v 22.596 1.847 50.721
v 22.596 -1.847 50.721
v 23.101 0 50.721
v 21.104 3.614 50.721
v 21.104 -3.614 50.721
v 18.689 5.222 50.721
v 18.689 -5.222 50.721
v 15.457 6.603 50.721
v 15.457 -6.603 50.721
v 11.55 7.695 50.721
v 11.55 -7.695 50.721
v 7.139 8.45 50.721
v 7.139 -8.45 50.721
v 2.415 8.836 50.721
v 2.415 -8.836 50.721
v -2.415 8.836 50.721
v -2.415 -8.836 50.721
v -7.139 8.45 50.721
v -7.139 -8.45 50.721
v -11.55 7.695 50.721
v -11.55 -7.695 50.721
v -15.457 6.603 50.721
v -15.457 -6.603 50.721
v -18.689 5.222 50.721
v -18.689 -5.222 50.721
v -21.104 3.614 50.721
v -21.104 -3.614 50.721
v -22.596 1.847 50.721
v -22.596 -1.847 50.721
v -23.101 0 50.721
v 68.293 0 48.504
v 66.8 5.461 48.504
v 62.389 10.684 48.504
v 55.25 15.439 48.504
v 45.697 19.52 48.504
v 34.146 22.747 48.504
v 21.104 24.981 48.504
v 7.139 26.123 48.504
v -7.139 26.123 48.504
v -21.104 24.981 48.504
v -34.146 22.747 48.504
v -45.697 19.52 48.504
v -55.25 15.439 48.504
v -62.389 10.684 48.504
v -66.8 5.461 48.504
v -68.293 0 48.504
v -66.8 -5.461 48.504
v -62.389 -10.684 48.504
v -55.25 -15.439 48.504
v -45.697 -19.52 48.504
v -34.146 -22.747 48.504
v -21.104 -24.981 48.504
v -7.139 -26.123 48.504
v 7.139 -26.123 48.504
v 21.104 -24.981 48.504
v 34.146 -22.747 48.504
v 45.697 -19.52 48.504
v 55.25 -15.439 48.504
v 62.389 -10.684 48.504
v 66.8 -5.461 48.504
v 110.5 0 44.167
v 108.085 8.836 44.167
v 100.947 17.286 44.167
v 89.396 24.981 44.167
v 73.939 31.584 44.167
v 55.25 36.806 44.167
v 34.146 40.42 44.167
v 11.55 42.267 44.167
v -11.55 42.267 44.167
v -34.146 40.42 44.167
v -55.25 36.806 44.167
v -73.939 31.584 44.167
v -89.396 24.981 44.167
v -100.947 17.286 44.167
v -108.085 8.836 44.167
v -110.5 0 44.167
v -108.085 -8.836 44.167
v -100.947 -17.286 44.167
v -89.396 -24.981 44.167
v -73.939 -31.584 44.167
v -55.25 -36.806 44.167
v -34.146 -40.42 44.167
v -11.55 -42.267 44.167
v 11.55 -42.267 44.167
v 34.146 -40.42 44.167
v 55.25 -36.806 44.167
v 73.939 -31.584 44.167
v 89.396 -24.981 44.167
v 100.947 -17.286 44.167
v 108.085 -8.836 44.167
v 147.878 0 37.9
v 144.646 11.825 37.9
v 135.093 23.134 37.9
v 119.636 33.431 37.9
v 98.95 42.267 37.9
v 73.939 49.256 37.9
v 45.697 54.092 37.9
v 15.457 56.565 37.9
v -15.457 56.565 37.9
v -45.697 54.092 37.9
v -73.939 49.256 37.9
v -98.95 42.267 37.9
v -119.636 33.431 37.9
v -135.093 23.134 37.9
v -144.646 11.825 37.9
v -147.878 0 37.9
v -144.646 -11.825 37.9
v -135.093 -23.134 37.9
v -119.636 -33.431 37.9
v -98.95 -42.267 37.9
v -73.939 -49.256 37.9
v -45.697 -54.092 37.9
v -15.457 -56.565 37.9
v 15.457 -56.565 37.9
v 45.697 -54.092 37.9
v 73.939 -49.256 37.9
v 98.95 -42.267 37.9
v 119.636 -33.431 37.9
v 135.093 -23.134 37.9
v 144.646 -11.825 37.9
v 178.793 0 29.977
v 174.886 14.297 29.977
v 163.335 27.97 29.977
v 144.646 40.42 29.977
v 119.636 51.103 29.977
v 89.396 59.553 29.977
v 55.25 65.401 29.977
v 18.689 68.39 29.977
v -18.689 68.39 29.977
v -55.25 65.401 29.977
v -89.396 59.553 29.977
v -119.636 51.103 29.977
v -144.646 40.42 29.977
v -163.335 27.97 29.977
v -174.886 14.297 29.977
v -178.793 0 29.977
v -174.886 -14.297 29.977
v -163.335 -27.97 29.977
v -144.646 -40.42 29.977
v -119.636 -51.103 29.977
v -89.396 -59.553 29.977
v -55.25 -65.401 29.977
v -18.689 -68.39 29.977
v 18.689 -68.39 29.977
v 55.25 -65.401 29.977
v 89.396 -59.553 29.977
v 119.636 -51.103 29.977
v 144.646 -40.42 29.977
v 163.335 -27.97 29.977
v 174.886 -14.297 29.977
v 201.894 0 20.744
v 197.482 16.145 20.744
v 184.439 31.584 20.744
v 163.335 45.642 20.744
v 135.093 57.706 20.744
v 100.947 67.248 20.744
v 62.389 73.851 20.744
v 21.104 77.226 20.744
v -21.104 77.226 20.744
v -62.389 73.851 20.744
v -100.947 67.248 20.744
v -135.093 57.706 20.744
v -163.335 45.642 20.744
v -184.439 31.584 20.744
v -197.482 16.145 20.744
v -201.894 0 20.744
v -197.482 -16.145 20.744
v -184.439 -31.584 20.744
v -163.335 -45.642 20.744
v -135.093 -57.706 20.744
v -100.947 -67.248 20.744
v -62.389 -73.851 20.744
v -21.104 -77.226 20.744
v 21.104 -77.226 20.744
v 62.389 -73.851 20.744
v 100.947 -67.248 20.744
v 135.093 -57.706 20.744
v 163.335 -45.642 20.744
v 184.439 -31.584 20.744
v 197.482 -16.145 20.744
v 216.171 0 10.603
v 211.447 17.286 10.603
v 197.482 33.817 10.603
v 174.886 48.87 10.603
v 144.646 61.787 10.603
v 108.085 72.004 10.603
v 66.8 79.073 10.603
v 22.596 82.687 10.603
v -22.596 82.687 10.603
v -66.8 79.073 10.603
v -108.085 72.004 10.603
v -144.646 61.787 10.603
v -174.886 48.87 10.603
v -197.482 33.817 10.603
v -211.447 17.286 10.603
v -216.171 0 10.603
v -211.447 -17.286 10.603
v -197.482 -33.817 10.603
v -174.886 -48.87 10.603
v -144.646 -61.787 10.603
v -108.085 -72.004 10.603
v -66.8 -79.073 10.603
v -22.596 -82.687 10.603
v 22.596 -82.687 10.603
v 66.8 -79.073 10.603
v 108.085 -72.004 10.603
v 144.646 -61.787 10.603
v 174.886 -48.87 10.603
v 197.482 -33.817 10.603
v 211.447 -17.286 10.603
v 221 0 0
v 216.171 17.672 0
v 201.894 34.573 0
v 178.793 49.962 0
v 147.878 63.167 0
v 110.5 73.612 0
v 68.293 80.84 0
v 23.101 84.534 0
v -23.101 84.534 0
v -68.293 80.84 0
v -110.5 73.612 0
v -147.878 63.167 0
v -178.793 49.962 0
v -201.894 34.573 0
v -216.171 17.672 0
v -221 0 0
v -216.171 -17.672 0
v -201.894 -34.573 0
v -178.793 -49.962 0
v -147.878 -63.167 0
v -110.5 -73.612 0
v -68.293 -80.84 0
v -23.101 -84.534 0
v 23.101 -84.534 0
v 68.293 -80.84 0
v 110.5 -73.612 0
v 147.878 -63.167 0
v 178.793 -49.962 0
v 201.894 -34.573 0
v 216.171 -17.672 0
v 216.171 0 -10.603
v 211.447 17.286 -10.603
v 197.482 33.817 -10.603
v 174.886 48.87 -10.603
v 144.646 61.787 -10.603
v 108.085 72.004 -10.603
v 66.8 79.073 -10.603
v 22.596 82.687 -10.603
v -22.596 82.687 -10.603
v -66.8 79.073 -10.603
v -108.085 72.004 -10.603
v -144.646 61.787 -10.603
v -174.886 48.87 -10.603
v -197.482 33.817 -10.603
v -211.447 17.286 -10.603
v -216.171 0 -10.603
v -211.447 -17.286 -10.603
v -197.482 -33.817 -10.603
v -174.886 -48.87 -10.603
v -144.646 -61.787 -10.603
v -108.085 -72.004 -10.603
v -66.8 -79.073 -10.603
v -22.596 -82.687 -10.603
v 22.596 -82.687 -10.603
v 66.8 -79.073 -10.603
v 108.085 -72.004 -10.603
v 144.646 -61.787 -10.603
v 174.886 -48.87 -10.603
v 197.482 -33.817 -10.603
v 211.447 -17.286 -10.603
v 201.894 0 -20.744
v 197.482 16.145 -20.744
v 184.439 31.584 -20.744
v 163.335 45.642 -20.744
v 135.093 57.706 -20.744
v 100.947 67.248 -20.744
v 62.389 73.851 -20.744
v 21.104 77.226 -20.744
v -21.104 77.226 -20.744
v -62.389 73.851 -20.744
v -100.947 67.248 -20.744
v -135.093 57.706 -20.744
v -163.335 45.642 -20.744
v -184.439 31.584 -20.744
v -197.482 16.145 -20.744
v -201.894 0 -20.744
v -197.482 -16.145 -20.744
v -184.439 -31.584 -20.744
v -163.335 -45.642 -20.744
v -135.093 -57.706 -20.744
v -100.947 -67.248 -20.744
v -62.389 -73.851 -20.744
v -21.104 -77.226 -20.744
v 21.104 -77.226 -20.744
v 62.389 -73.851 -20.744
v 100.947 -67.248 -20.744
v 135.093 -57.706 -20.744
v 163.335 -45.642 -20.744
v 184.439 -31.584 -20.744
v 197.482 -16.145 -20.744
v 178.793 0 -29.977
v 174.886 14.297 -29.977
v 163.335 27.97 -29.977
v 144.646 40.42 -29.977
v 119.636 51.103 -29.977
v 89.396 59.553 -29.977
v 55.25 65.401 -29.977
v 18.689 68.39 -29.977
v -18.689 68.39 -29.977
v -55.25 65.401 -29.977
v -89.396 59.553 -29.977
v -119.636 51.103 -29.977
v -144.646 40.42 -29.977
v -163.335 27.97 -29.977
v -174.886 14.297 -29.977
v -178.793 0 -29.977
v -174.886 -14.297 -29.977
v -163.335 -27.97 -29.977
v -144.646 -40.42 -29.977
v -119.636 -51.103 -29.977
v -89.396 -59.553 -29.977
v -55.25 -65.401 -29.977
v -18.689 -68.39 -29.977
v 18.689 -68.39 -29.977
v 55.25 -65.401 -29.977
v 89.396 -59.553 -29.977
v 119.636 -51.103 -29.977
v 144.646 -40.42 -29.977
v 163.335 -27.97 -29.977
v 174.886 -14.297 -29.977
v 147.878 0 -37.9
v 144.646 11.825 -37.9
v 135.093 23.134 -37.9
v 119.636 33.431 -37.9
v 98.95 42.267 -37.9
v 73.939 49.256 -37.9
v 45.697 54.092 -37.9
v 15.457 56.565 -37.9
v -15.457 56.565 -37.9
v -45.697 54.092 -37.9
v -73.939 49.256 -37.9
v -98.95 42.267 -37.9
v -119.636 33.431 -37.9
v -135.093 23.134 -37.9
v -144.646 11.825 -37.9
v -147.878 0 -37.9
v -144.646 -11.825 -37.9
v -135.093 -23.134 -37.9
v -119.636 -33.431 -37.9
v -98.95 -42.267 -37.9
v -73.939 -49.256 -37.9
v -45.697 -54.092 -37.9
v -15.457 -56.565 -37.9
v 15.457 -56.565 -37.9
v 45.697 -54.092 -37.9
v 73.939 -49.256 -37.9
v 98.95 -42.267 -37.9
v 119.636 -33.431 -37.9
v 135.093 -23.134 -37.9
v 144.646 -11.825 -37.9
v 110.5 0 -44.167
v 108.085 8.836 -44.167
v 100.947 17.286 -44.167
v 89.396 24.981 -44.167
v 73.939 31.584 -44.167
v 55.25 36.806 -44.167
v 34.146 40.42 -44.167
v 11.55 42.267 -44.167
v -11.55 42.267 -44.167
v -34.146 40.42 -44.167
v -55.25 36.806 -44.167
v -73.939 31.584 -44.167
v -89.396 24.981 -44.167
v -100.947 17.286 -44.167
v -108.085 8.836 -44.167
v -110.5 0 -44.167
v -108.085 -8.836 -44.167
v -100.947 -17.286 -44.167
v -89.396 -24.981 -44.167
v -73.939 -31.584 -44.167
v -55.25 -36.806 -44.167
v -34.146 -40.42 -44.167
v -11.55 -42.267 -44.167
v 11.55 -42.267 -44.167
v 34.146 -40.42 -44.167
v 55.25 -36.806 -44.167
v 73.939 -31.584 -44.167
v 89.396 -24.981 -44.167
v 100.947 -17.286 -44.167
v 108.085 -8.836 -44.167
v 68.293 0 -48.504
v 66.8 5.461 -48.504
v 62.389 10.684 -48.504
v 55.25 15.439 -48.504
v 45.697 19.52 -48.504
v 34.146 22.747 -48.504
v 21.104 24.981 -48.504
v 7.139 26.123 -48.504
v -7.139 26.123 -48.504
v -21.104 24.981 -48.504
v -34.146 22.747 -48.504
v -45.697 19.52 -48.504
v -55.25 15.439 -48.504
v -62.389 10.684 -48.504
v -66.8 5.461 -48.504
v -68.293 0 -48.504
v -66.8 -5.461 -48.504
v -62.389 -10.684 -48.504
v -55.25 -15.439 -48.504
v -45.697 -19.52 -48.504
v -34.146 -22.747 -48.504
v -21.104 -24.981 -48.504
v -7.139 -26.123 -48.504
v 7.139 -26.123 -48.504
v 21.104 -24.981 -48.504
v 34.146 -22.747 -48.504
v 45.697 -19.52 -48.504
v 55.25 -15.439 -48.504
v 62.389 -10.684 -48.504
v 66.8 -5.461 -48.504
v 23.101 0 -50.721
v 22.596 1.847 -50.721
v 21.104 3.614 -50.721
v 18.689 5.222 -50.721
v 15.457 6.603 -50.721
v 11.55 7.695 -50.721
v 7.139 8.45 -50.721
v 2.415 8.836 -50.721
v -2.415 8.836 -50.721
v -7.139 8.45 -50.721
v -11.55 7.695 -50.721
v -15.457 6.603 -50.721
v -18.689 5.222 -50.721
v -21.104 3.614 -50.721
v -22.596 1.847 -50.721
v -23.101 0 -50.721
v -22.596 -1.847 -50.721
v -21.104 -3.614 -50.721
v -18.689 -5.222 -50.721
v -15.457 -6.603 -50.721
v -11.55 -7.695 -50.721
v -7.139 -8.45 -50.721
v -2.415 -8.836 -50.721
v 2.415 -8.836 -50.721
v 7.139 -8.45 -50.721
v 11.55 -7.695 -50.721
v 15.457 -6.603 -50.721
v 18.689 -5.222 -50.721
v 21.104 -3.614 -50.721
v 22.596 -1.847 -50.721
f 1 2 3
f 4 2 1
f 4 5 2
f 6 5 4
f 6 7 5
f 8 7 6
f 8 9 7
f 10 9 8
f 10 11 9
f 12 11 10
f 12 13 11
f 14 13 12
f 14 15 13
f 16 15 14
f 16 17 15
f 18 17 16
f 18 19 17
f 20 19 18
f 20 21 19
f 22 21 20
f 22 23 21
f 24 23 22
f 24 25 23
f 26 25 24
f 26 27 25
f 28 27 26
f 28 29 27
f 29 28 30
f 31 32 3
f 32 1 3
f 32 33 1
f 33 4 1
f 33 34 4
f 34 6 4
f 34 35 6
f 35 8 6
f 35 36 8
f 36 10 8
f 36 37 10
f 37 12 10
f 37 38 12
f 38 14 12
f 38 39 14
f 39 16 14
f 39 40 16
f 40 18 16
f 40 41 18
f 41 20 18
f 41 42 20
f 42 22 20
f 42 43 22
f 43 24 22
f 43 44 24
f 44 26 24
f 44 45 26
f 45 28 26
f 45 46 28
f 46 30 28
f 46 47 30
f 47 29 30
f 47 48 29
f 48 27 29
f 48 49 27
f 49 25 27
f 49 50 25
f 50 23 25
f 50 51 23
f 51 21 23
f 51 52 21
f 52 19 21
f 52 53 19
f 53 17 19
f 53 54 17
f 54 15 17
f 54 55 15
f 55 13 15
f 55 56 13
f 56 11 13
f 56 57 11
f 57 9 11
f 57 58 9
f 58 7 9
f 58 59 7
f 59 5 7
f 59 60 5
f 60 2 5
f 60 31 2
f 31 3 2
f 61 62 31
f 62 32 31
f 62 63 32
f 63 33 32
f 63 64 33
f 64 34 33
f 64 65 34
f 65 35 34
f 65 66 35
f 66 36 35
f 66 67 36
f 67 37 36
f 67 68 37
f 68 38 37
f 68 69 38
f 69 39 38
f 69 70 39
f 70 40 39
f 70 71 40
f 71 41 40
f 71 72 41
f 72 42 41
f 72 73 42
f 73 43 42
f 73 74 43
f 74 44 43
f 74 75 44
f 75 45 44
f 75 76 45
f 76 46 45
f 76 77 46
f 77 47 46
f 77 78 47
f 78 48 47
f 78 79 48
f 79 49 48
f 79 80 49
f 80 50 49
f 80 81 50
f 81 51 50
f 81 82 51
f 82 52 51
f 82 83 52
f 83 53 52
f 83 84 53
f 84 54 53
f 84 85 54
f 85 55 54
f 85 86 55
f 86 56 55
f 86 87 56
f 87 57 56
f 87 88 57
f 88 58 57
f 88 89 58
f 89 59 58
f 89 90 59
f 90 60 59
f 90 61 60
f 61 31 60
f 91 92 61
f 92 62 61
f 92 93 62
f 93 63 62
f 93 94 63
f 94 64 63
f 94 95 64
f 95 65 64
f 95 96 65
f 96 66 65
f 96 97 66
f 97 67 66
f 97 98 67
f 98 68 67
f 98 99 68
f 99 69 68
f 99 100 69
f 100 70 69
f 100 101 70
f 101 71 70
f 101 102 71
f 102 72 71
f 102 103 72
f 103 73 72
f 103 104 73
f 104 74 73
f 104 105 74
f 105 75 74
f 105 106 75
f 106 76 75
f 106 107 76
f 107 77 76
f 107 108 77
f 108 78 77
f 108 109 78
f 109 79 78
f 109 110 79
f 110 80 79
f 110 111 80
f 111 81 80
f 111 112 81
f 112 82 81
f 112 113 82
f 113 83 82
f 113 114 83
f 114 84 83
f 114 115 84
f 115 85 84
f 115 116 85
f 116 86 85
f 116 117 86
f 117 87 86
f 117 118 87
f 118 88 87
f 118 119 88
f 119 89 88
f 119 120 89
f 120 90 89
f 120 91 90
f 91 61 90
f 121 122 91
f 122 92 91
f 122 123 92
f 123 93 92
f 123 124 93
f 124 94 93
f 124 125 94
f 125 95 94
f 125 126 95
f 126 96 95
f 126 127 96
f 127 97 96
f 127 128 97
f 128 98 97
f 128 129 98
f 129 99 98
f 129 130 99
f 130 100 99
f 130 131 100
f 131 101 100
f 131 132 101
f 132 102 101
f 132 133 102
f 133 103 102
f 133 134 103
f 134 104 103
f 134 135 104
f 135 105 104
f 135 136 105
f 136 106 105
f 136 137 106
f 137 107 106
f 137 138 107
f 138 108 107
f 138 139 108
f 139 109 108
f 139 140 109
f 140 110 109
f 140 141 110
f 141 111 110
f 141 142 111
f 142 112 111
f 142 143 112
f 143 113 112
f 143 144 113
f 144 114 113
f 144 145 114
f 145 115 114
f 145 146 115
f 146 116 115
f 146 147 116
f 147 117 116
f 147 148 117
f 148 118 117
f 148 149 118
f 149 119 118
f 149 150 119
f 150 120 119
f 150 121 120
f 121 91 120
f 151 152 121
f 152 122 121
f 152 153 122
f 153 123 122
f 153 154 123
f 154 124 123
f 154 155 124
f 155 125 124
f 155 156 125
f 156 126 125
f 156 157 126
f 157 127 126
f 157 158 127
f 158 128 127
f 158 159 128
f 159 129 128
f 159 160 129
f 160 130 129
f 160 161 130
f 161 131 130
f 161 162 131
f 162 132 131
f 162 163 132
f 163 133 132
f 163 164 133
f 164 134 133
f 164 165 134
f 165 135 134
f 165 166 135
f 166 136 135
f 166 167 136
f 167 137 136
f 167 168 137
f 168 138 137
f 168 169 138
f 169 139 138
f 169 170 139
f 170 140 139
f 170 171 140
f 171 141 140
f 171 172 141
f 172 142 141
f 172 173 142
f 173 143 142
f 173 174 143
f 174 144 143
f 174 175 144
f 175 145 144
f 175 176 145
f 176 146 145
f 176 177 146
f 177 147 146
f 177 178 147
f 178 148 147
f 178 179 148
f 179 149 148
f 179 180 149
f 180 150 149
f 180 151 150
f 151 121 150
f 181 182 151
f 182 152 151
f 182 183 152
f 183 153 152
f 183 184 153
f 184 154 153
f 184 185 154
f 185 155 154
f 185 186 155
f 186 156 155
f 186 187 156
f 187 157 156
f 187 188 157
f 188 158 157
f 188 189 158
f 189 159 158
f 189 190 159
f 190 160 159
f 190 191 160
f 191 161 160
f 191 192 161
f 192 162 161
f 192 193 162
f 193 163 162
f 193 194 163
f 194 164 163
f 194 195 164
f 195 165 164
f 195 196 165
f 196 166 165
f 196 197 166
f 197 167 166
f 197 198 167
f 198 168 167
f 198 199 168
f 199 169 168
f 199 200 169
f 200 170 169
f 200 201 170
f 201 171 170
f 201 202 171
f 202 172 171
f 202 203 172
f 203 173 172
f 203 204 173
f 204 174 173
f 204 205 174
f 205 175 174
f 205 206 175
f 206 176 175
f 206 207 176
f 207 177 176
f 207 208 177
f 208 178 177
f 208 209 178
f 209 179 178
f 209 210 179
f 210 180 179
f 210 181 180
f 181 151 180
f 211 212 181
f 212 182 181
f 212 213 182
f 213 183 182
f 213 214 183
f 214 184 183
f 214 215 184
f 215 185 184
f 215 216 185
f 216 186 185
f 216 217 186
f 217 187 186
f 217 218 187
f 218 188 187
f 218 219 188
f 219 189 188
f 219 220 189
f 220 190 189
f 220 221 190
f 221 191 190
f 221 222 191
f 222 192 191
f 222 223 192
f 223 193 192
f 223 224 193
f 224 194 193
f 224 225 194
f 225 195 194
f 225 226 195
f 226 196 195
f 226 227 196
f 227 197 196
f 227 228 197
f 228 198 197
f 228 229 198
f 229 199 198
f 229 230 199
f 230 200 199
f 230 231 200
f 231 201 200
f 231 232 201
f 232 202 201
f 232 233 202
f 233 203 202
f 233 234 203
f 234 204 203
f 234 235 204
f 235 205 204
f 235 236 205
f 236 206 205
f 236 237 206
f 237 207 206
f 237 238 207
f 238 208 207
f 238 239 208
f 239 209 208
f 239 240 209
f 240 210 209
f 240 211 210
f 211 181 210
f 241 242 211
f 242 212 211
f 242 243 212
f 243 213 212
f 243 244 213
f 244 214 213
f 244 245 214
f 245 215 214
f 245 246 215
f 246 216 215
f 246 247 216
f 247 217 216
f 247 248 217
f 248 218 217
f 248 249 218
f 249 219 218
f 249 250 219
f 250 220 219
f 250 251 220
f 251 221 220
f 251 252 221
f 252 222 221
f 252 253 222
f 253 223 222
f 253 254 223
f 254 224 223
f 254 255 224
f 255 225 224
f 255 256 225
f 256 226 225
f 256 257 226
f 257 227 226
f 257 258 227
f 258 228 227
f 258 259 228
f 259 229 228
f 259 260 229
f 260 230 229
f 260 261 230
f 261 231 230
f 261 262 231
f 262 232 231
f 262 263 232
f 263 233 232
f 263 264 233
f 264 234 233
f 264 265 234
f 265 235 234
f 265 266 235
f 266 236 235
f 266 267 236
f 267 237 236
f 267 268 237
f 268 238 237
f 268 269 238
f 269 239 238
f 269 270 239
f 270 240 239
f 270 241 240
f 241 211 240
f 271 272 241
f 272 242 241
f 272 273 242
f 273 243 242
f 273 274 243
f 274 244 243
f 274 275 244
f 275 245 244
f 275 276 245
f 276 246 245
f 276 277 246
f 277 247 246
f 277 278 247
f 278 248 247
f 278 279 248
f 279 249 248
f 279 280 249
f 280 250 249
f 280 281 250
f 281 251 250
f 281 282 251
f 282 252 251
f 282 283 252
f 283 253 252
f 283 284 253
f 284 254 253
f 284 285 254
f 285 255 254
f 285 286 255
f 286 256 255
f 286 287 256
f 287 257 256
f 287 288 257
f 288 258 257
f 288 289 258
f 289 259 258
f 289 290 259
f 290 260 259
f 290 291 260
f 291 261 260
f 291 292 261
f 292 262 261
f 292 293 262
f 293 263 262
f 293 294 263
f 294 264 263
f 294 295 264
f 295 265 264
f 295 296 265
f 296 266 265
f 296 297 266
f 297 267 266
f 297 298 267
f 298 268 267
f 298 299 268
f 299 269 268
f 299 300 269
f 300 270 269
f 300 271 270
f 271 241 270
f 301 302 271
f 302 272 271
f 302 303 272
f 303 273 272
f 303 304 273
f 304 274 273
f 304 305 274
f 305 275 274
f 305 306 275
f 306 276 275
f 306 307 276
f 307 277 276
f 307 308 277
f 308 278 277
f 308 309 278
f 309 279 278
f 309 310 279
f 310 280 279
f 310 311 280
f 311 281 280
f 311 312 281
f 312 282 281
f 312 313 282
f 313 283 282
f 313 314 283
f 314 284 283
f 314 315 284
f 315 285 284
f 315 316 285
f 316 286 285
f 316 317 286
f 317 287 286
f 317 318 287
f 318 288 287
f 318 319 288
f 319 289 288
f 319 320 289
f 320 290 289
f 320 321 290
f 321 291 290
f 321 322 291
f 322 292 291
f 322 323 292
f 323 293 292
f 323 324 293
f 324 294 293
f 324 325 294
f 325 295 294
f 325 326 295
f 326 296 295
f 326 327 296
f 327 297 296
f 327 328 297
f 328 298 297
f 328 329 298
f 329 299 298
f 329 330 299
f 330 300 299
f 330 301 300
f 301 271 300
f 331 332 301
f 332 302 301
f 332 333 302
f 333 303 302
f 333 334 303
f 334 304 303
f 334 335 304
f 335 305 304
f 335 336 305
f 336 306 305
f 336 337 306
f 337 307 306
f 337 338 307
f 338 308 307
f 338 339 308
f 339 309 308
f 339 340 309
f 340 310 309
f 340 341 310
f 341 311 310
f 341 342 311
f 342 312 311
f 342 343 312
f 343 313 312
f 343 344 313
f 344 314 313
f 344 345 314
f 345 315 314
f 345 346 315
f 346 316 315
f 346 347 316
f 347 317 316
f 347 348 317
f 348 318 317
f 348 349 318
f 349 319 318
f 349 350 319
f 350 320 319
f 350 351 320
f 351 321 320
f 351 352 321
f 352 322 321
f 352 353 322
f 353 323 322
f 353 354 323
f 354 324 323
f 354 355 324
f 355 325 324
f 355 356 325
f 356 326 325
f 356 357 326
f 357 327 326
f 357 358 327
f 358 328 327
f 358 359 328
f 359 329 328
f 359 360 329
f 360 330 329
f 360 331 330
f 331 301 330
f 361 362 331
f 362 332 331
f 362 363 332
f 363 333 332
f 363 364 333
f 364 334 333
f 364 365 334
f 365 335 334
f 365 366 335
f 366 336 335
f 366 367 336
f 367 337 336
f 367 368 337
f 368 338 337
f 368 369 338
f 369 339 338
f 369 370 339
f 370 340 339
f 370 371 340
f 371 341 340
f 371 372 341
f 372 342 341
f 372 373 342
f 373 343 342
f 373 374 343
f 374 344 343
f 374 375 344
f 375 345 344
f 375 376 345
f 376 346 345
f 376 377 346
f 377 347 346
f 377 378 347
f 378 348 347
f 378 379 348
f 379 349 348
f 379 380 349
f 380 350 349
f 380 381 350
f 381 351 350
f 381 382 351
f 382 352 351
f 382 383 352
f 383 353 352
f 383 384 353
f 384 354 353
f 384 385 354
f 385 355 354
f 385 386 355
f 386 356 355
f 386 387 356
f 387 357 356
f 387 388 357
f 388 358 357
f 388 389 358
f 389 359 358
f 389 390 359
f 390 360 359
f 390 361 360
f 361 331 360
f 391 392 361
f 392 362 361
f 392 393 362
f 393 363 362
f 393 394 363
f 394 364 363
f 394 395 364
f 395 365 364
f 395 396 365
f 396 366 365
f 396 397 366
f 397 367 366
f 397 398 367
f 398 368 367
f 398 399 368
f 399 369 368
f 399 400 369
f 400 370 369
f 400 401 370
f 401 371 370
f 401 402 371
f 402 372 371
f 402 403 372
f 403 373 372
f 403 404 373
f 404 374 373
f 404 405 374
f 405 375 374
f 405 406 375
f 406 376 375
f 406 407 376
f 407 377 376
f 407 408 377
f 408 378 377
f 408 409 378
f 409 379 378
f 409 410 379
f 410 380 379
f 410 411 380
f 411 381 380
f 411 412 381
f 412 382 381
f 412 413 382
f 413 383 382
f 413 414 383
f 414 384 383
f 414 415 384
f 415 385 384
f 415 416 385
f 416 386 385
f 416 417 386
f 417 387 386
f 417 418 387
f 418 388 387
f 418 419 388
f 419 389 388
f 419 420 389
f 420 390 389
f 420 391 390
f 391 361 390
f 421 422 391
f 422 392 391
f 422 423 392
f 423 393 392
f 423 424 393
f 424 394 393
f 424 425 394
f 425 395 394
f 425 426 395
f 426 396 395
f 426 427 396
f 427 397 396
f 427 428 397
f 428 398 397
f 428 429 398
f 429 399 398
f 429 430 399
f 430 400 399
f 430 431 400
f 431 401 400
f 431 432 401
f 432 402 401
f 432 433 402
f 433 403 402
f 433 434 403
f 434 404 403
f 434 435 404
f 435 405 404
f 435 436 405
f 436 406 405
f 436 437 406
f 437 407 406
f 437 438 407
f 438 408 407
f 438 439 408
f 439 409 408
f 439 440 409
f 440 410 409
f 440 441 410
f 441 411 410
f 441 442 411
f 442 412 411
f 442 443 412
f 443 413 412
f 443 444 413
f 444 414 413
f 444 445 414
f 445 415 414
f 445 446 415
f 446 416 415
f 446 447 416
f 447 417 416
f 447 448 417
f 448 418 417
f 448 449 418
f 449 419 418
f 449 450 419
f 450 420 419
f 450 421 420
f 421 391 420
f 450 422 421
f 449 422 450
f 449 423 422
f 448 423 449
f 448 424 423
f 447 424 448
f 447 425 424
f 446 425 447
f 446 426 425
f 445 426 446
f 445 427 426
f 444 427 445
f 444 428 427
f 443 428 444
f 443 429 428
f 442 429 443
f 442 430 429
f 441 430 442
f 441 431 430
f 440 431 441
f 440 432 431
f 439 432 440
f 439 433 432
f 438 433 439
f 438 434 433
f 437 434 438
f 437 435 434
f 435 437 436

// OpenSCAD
// Generated by SolidPython 1.0.1 on 2020-07-29 00:46:50


scale(v = [13, 5, 3]) {
	sphere(r = 17);
}
/***********************************************
*********      SolidPython code:      **********
************************************************
 
# import packages: SolidPython
from solid import *
from solid.utils import *
from itertools import chain, combinations, permutations


class Resize:

    def __init__(self, scad_file):
        self.scad_file = scad_file
        #self.scad_file = import_scad(scad_file)
        # cone/cylinder param:
        self.r1 = 0
        self.r2 = 0
        self.h = 0
        # rectangular prism param:
        self.w = 0
        self.l = 0
        # ellipse param:
        self.r = 0

    # import OpenScad code (file name corresponds to shape)


    # classify shape + parameters
    def assign(self, param1, param2, param3):
        if self.scad_file == 'cone.scad':
            self.r1 = param1
            self.r2 = param2
            self.h = param3
        elif self.scad_file == 'cylinder.scad':
            self.r1 = param1
            self.r2 = param2
            self.h = param3
        elif self.scad_file == 'rectangularPrism.scad':
            self.h = param1
            self.l = param2
            self.w = param3
        else:
            self.r = param1
            self.h = param2

    # resize parameters
    def iterate(self):
        x = range(3, 20, 2)
        i = 1
        if self.scad_file == 'cone.scad':
            tempList = list(permutations(x, 2))
            for temp in tempList:
                param1 = temp[0]
                param2 = temp[1]
                filepath = 'produced_scad_files/' + 'cone' + str(param1) + '_' + str(param2) + '_' + '.scad'
                scad_render_to_file(cylinder(h=param1, r1=param2, r2=0), filepath)

        elif self.scad_file == 'cylinder.scad':
            tempList = list(permutations(x, 3))
            for temp in tempList:
                param1 = temp[0]
                param2 = temp[1]
                filepath = 'produced_scad_files/' + 'cylinder' + str(param1) + '_' + str(param2) + '_' + '.scad'
                scad_render_to_file(cylinder(h=param1, r1=param2, r2=param2), filepath)

        elif self.scad_file == 'rectangularPrism.scad':
            tempList = list(permutations(x, 3))
            for temp in tempList:
                param1 = temp[0]
                param2 = temp[1]
                param3 = temp[2]
                filepath = 'produced_scad_files/' + 'rectangularPrism' + str(param1) + '_' + str(param2) + '_' + str(
                    param3) + '.scad'
                scad_render_to_file(cube(size=(param1, param2, param3)), filepath)

        elif self.scad_file == 'ellipse.scad':
            tempList = list(permutations(x, 4))
            for temp in tempList:
                param1 = temp[0]
                param2 = temp[1]
                param3 = temp[2]
                param4 = temp[3]
                filepath = 'produced_scad_files/' + 'ellipse' + str(param1) + '_' + str(param2) + '_' + str(param3) + '_' + str(param4) + '.scad'
                scad_render_to_file(scale([param1, param2, param3])(sphere(r=param4)), filepath)

    def render_to_scadfile(self):
        scad_render_to_file(scad, 'example.scad') 
 
************************************************/
